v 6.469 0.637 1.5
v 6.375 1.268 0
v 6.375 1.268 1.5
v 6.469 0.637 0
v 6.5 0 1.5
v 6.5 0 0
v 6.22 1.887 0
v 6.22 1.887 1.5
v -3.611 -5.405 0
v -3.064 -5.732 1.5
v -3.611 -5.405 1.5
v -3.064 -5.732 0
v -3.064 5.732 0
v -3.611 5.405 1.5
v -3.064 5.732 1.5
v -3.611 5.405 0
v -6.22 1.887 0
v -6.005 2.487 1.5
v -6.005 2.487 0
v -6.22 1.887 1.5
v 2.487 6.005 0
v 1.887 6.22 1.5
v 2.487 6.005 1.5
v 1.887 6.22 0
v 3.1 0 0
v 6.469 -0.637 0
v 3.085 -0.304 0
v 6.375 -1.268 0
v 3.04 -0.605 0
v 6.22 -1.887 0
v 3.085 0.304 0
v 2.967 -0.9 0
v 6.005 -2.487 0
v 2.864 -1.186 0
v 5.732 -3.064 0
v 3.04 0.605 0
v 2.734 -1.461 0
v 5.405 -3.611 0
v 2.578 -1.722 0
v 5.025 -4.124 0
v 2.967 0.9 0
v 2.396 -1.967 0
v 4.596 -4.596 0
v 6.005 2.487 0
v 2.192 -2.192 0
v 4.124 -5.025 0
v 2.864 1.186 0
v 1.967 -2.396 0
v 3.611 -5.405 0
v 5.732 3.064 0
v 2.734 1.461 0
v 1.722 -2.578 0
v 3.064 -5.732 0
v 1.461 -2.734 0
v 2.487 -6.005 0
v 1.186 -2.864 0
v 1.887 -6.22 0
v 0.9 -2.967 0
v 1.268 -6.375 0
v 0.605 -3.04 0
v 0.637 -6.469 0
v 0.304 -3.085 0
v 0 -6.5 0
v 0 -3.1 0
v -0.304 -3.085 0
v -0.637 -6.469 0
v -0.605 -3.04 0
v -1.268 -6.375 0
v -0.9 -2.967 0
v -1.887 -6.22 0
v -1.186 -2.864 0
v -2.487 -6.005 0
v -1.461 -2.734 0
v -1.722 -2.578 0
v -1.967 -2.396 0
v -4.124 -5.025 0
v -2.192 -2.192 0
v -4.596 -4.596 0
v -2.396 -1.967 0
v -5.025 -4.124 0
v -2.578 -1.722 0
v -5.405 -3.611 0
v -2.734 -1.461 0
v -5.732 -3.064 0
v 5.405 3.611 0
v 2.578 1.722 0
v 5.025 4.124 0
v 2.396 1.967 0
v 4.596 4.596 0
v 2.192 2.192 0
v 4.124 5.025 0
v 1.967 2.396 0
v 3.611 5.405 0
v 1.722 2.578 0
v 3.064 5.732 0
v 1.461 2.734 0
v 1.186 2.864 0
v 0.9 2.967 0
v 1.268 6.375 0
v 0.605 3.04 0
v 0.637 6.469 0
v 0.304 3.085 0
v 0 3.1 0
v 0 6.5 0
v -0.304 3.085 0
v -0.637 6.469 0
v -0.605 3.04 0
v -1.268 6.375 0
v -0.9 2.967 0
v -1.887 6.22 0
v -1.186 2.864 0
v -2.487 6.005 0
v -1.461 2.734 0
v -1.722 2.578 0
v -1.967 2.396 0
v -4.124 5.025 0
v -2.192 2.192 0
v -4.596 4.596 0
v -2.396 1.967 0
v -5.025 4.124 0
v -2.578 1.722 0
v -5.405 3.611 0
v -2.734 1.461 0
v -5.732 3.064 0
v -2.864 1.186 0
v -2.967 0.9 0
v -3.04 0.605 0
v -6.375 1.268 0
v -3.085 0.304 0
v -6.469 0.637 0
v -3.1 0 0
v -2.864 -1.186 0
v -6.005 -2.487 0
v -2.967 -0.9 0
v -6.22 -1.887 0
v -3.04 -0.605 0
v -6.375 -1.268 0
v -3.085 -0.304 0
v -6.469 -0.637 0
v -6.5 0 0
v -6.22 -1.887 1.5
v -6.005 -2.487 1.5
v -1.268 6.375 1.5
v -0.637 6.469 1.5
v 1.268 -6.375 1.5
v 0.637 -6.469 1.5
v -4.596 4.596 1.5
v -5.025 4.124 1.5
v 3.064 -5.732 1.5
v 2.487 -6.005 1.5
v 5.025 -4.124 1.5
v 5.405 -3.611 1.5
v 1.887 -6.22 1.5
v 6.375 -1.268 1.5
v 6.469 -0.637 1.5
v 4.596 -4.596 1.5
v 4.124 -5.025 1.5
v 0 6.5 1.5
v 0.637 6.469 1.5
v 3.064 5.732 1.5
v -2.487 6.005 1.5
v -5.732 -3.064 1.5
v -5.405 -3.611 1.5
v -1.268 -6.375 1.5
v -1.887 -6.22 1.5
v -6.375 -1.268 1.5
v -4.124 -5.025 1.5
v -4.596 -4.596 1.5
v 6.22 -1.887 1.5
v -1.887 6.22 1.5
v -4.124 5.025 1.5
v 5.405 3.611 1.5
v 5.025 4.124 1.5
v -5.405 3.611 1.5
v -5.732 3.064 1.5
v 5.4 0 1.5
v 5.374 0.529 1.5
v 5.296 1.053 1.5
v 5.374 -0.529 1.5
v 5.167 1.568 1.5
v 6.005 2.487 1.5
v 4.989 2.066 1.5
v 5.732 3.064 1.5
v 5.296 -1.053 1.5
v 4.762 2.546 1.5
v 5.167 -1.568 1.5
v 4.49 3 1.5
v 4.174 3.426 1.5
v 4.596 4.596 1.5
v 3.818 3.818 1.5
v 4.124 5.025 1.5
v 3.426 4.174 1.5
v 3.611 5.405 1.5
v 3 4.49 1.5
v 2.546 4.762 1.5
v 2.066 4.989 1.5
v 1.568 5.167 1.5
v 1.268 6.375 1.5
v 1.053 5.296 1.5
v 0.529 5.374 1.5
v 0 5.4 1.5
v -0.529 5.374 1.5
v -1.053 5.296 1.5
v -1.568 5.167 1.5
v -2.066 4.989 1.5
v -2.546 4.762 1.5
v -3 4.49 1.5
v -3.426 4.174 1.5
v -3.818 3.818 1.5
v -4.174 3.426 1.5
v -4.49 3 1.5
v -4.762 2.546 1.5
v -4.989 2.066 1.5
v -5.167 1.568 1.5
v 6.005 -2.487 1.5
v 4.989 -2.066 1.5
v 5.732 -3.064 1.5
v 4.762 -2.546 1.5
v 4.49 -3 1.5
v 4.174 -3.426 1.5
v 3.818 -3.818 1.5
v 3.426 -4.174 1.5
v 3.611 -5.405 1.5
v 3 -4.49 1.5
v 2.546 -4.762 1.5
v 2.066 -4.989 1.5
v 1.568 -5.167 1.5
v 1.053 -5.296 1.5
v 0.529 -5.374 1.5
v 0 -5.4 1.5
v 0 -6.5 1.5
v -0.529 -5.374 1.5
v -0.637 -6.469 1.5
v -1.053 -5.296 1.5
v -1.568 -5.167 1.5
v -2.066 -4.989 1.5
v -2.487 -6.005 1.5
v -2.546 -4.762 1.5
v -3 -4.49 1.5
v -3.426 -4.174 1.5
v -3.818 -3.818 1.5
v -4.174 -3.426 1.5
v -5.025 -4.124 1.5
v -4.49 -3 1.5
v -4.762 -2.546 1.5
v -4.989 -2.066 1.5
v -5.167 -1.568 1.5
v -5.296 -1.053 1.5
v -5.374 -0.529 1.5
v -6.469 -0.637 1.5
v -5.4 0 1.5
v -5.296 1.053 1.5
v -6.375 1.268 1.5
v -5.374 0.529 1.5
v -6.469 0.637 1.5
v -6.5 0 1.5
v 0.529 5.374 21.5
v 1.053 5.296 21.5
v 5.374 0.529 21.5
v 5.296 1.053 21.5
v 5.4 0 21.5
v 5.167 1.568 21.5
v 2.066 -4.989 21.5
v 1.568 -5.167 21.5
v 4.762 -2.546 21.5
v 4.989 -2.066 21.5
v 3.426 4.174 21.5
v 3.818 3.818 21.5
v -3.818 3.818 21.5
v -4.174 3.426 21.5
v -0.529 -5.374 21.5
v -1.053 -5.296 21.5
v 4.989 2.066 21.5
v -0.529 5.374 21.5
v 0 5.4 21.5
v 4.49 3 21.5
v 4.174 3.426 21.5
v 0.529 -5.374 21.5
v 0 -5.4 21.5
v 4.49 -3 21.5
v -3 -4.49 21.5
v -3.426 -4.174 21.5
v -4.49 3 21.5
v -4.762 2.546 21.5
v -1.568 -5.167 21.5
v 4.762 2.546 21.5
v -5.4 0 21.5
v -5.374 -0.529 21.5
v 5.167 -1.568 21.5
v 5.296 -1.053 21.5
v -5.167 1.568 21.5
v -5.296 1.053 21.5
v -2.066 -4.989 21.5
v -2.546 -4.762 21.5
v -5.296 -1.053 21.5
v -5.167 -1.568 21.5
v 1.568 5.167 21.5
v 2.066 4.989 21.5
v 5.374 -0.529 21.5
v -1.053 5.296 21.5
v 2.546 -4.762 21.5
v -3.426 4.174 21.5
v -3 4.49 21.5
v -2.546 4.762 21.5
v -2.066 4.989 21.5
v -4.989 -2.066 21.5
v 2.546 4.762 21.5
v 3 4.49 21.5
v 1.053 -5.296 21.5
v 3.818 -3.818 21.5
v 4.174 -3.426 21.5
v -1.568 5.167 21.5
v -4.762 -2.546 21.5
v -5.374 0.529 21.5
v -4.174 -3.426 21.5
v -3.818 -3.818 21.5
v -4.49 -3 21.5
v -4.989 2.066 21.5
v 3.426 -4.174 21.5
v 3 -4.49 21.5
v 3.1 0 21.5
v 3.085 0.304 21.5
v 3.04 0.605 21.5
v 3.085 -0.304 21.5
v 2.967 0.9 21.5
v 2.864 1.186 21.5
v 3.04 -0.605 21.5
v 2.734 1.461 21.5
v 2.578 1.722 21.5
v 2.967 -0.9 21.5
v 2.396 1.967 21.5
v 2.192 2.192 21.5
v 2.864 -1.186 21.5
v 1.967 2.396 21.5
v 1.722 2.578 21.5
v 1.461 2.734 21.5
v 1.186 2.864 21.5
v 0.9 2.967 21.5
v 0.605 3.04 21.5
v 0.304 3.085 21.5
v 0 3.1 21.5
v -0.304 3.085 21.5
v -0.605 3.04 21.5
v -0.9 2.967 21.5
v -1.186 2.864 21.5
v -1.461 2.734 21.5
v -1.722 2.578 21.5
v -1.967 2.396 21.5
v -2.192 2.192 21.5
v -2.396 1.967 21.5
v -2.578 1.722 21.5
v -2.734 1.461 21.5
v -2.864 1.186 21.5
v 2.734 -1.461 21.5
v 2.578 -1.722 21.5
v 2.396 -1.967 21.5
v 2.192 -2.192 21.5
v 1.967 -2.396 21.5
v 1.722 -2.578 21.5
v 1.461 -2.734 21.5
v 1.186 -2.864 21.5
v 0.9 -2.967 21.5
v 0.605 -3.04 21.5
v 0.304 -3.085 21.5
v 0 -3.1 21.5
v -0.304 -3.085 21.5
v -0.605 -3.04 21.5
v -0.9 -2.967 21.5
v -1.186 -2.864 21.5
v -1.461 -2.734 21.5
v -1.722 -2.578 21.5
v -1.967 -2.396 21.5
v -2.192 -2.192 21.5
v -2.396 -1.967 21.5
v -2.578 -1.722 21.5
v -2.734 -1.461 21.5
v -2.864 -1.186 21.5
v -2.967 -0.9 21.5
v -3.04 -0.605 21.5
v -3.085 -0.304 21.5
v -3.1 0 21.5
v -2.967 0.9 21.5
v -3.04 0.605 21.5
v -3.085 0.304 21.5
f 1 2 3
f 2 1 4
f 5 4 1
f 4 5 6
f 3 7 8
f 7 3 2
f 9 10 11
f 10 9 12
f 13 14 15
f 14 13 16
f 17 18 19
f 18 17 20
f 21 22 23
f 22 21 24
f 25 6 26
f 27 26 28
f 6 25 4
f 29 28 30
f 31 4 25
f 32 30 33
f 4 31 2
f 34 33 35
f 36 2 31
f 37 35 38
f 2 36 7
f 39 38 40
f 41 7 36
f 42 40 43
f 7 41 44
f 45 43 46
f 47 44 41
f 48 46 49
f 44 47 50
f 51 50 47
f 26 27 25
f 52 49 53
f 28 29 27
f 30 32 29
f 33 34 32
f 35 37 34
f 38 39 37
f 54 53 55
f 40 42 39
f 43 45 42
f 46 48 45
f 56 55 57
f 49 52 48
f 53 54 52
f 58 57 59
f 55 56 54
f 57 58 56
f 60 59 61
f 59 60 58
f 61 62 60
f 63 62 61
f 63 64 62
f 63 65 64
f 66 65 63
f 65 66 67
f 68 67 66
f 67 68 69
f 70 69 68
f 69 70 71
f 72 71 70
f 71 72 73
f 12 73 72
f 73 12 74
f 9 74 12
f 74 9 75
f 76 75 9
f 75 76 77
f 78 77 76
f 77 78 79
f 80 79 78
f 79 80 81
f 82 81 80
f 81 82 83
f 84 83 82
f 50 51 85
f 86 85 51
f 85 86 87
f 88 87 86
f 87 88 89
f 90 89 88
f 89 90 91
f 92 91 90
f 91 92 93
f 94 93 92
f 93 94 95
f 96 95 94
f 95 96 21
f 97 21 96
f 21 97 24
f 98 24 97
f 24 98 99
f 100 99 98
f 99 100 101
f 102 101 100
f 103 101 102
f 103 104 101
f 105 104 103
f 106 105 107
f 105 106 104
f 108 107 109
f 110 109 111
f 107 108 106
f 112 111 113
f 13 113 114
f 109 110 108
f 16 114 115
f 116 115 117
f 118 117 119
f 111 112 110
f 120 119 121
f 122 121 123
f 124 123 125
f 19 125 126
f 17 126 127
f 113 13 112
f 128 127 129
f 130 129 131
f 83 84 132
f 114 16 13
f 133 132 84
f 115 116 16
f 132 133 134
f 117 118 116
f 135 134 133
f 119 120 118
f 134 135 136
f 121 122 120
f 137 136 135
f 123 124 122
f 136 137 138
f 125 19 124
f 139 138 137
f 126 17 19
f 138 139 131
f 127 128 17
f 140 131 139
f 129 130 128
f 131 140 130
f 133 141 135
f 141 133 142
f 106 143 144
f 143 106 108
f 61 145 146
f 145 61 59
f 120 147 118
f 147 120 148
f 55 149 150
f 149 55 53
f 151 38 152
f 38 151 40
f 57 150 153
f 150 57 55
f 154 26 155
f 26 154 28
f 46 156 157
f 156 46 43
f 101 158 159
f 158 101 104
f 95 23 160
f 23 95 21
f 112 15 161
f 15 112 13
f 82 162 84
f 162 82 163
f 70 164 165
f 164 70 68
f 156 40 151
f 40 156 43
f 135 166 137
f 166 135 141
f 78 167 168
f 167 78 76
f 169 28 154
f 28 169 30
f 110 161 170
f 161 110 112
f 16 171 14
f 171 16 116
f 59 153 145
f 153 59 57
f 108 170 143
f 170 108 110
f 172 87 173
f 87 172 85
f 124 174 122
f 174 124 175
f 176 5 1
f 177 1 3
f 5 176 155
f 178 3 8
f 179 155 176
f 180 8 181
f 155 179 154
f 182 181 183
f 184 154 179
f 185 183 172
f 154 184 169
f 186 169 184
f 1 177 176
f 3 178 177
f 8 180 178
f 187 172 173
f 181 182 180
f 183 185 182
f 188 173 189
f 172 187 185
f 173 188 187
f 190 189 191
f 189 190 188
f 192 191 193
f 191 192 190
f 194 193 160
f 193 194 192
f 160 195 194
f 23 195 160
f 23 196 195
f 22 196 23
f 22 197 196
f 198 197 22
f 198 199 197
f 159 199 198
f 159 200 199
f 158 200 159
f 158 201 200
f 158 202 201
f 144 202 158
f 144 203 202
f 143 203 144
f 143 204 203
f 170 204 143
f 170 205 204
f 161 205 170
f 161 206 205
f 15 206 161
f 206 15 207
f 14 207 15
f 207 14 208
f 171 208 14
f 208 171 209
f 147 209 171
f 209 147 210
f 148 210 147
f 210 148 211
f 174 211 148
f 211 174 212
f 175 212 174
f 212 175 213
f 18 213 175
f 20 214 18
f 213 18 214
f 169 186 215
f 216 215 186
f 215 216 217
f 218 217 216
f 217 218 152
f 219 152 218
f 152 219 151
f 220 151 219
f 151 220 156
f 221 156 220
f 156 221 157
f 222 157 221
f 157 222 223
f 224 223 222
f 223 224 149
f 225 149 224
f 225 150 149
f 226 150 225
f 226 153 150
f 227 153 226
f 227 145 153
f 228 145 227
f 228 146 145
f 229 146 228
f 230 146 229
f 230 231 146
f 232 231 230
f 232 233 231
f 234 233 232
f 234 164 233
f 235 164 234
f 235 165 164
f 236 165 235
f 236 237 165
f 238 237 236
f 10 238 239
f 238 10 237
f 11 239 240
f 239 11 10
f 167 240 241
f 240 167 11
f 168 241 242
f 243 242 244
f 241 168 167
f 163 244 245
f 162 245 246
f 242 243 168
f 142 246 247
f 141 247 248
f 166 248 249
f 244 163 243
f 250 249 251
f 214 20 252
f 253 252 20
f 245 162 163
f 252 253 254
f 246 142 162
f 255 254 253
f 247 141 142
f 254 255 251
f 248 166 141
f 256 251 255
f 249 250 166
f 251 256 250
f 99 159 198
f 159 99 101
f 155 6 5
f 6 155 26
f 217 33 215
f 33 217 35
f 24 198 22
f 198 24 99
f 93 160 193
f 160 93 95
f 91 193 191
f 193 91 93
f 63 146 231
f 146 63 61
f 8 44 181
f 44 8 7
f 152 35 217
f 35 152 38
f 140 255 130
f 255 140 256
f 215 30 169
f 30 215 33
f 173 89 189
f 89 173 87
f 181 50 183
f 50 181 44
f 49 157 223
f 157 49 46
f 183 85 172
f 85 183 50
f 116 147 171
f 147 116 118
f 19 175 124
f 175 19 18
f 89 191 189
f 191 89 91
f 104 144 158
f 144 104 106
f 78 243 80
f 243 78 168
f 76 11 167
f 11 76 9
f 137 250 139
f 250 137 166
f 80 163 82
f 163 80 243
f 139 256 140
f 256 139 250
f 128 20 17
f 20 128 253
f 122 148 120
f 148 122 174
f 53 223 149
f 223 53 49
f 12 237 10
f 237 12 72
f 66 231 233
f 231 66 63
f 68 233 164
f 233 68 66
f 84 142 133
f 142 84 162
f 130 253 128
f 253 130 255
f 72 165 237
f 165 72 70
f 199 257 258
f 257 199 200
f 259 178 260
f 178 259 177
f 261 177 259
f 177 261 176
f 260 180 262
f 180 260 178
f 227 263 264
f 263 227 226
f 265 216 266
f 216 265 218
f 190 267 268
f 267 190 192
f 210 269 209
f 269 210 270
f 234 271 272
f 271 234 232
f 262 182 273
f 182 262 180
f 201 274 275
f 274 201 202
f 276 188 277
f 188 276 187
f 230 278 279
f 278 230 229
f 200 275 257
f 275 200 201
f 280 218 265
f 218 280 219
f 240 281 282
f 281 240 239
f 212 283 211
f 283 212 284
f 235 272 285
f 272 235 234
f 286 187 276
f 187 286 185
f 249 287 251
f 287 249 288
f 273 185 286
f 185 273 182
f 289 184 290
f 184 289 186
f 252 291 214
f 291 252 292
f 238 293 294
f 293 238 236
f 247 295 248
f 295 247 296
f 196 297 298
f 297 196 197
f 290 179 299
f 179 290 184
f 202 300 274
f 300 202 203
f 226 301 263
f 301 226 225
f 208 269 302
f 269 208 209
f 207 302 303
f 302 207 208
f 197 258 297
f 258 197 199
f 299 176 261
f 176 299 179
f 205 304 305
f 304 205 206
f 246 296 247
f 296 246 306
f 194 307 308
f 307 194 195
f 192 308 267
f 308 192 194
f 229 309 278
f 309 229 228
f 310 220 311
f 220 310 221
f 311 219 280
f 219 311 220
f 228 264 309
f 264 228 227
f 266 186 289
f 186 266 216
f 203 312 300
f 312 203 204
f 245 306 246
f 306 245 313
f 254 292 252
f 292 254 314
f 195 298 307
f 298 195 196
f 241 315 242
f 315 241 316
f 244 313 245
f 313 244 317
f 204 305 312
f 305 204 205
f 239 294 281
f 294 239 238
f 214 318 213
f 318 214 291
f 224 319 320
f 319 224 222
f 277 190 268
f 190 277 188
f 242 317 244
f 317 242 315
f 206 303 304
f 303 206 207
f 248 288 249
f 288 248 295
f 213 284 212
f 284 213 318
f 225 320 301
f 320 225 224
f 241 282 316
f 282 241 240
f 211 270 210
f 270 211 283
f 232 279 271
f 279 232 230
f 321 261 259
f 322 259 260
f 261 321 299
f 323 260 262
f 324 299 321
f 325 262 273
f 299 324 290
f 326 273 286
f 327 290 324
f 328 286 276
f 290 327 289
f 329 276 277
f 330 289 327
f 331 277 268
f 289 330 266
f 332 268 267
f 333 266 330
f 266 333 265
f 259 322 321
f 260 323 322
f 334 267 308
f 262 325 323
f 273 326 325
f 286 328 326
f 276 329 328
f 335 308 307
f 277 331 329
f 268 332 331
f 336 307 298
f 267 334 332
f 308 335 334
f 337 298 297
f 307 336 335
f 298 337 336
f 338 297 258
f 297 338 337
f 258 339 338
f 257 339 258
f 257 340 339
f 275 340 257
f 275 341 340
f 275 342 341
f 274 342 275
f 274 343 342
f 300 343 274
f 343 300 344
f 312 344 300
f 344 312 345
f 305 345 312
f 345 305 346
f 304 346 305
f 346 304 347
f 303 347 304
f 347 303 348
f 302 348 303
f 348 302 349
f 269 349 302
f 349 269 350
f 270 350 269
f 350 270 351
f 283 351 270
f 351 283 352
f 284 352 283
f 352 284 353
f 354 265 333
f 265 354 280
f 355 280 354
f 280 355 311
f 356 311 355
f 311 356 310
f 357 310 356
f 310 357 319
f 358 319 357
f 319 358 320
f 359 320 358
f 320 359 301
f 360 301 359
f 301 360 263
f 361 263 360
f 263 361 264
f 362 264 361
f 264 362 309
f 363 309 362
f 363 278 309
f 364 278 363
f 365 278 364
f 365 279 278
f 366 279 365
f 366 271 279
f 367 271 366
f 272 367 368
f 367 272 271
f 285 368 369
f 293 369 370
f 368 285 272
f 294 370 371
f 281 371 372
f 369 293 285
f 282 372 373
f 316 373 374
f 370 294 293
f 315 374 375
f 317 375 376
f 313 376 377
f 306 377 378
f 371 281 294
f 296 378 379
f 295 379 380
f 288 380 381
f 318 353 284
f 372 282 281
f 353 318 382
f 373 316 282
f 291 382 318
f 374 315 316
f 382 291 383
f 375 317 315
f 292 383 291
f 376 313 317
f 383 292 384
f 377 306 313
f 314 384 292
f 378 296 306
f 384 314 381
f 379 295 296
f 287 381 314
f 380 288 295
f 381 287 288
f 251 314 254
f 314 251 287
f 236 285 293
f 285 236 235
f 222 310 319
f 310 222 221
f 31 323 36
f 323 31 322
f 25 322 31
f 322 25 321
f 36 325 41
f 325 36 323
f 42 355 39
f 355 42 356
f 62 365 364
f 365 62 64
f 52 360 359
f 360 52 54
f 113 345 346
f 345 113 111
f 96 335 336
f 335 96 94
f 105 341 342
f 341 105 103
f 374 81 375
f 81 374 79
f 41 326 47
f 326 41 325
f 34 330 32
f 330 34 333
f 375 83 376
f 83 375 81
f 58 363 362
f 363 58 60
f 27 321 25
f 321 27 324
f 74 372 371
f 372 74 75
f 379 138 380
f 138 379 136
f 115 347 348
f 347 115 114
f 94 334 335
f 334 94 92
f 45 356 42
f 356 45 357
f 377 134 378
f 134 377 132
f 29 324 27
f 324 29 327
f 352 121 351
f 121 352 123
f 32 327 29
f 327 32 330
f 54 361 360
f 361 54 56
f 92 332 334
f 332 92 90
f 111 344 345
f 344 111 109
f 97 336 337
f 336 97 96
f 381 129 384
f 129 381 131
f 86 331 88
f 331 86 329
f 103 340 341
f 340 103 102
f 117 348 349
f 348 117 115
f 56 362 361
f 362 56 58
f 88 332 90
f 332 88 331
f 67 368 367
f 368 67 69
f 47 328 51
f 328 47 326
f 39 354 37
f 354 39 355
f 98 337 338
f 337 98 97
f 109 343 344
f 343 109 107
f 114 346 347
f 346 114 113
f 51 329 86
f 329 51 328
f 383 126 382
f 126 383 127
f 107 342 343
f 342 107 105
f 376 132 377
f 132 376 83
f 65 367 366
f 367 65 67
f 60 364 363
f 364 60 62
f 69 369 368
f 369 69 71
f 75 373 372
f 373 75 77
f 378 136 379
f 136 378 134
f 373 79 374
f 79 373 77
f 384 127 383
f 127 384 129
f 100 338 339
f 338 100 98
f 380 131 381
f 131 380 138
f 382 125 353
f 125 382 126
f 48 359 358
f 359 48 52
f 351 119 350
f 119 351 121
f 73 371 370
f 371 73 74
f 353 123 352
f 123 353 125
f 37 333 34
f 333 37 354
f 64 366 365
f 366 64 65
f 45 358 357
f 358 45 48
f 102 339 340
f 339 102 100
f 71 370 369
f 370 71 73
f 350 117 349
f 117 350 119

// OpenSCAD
// Parameters (mm)
collar_diameter = 13;          // Collar outer diameter
collar_thickness = 1.5;        // Collar height (lies on the bed)
sleeve_outer_diameter = 10.8; // Sleeve outer diameter
sleeve_body_height = 20.0;     // Height of sleeve body (from collar top to top of part)
bore_diameter = 6.2;           // Diameter of the through bore
total_height = collar_thickness + sleeve_body_height; // Full part height = 21.5 mm
extra_cut = 0.5;               // Extra length of bore beyond each face (0.5 mm)

// Set resolution for curved features
$fn = 64;

// Main solid (collar + sleeve)
module part() {
    union() {
        // Collar (bottom)
        translate([0, 0, 0])
            cylinder(d = collar_diameter, h = collar_thickness);
        // Sleeve body (above collar)
        translate([0, 0, collar_thickness])
            cylinder(d = sleeve_outer_diameter, h = sleeve_body_height);
    }
}

// Bore that cuts through the whole part
module bore() {
    // Extend bore 0.5 mm below the bed and 0.5 mm above the top
    translate([0, 0, -extra_cut])
        cylinder(d = bore_diameter, h = total_height + 2*extra_cut);
}

// Final part with bore
difference() {
    part();
    bore();
}
